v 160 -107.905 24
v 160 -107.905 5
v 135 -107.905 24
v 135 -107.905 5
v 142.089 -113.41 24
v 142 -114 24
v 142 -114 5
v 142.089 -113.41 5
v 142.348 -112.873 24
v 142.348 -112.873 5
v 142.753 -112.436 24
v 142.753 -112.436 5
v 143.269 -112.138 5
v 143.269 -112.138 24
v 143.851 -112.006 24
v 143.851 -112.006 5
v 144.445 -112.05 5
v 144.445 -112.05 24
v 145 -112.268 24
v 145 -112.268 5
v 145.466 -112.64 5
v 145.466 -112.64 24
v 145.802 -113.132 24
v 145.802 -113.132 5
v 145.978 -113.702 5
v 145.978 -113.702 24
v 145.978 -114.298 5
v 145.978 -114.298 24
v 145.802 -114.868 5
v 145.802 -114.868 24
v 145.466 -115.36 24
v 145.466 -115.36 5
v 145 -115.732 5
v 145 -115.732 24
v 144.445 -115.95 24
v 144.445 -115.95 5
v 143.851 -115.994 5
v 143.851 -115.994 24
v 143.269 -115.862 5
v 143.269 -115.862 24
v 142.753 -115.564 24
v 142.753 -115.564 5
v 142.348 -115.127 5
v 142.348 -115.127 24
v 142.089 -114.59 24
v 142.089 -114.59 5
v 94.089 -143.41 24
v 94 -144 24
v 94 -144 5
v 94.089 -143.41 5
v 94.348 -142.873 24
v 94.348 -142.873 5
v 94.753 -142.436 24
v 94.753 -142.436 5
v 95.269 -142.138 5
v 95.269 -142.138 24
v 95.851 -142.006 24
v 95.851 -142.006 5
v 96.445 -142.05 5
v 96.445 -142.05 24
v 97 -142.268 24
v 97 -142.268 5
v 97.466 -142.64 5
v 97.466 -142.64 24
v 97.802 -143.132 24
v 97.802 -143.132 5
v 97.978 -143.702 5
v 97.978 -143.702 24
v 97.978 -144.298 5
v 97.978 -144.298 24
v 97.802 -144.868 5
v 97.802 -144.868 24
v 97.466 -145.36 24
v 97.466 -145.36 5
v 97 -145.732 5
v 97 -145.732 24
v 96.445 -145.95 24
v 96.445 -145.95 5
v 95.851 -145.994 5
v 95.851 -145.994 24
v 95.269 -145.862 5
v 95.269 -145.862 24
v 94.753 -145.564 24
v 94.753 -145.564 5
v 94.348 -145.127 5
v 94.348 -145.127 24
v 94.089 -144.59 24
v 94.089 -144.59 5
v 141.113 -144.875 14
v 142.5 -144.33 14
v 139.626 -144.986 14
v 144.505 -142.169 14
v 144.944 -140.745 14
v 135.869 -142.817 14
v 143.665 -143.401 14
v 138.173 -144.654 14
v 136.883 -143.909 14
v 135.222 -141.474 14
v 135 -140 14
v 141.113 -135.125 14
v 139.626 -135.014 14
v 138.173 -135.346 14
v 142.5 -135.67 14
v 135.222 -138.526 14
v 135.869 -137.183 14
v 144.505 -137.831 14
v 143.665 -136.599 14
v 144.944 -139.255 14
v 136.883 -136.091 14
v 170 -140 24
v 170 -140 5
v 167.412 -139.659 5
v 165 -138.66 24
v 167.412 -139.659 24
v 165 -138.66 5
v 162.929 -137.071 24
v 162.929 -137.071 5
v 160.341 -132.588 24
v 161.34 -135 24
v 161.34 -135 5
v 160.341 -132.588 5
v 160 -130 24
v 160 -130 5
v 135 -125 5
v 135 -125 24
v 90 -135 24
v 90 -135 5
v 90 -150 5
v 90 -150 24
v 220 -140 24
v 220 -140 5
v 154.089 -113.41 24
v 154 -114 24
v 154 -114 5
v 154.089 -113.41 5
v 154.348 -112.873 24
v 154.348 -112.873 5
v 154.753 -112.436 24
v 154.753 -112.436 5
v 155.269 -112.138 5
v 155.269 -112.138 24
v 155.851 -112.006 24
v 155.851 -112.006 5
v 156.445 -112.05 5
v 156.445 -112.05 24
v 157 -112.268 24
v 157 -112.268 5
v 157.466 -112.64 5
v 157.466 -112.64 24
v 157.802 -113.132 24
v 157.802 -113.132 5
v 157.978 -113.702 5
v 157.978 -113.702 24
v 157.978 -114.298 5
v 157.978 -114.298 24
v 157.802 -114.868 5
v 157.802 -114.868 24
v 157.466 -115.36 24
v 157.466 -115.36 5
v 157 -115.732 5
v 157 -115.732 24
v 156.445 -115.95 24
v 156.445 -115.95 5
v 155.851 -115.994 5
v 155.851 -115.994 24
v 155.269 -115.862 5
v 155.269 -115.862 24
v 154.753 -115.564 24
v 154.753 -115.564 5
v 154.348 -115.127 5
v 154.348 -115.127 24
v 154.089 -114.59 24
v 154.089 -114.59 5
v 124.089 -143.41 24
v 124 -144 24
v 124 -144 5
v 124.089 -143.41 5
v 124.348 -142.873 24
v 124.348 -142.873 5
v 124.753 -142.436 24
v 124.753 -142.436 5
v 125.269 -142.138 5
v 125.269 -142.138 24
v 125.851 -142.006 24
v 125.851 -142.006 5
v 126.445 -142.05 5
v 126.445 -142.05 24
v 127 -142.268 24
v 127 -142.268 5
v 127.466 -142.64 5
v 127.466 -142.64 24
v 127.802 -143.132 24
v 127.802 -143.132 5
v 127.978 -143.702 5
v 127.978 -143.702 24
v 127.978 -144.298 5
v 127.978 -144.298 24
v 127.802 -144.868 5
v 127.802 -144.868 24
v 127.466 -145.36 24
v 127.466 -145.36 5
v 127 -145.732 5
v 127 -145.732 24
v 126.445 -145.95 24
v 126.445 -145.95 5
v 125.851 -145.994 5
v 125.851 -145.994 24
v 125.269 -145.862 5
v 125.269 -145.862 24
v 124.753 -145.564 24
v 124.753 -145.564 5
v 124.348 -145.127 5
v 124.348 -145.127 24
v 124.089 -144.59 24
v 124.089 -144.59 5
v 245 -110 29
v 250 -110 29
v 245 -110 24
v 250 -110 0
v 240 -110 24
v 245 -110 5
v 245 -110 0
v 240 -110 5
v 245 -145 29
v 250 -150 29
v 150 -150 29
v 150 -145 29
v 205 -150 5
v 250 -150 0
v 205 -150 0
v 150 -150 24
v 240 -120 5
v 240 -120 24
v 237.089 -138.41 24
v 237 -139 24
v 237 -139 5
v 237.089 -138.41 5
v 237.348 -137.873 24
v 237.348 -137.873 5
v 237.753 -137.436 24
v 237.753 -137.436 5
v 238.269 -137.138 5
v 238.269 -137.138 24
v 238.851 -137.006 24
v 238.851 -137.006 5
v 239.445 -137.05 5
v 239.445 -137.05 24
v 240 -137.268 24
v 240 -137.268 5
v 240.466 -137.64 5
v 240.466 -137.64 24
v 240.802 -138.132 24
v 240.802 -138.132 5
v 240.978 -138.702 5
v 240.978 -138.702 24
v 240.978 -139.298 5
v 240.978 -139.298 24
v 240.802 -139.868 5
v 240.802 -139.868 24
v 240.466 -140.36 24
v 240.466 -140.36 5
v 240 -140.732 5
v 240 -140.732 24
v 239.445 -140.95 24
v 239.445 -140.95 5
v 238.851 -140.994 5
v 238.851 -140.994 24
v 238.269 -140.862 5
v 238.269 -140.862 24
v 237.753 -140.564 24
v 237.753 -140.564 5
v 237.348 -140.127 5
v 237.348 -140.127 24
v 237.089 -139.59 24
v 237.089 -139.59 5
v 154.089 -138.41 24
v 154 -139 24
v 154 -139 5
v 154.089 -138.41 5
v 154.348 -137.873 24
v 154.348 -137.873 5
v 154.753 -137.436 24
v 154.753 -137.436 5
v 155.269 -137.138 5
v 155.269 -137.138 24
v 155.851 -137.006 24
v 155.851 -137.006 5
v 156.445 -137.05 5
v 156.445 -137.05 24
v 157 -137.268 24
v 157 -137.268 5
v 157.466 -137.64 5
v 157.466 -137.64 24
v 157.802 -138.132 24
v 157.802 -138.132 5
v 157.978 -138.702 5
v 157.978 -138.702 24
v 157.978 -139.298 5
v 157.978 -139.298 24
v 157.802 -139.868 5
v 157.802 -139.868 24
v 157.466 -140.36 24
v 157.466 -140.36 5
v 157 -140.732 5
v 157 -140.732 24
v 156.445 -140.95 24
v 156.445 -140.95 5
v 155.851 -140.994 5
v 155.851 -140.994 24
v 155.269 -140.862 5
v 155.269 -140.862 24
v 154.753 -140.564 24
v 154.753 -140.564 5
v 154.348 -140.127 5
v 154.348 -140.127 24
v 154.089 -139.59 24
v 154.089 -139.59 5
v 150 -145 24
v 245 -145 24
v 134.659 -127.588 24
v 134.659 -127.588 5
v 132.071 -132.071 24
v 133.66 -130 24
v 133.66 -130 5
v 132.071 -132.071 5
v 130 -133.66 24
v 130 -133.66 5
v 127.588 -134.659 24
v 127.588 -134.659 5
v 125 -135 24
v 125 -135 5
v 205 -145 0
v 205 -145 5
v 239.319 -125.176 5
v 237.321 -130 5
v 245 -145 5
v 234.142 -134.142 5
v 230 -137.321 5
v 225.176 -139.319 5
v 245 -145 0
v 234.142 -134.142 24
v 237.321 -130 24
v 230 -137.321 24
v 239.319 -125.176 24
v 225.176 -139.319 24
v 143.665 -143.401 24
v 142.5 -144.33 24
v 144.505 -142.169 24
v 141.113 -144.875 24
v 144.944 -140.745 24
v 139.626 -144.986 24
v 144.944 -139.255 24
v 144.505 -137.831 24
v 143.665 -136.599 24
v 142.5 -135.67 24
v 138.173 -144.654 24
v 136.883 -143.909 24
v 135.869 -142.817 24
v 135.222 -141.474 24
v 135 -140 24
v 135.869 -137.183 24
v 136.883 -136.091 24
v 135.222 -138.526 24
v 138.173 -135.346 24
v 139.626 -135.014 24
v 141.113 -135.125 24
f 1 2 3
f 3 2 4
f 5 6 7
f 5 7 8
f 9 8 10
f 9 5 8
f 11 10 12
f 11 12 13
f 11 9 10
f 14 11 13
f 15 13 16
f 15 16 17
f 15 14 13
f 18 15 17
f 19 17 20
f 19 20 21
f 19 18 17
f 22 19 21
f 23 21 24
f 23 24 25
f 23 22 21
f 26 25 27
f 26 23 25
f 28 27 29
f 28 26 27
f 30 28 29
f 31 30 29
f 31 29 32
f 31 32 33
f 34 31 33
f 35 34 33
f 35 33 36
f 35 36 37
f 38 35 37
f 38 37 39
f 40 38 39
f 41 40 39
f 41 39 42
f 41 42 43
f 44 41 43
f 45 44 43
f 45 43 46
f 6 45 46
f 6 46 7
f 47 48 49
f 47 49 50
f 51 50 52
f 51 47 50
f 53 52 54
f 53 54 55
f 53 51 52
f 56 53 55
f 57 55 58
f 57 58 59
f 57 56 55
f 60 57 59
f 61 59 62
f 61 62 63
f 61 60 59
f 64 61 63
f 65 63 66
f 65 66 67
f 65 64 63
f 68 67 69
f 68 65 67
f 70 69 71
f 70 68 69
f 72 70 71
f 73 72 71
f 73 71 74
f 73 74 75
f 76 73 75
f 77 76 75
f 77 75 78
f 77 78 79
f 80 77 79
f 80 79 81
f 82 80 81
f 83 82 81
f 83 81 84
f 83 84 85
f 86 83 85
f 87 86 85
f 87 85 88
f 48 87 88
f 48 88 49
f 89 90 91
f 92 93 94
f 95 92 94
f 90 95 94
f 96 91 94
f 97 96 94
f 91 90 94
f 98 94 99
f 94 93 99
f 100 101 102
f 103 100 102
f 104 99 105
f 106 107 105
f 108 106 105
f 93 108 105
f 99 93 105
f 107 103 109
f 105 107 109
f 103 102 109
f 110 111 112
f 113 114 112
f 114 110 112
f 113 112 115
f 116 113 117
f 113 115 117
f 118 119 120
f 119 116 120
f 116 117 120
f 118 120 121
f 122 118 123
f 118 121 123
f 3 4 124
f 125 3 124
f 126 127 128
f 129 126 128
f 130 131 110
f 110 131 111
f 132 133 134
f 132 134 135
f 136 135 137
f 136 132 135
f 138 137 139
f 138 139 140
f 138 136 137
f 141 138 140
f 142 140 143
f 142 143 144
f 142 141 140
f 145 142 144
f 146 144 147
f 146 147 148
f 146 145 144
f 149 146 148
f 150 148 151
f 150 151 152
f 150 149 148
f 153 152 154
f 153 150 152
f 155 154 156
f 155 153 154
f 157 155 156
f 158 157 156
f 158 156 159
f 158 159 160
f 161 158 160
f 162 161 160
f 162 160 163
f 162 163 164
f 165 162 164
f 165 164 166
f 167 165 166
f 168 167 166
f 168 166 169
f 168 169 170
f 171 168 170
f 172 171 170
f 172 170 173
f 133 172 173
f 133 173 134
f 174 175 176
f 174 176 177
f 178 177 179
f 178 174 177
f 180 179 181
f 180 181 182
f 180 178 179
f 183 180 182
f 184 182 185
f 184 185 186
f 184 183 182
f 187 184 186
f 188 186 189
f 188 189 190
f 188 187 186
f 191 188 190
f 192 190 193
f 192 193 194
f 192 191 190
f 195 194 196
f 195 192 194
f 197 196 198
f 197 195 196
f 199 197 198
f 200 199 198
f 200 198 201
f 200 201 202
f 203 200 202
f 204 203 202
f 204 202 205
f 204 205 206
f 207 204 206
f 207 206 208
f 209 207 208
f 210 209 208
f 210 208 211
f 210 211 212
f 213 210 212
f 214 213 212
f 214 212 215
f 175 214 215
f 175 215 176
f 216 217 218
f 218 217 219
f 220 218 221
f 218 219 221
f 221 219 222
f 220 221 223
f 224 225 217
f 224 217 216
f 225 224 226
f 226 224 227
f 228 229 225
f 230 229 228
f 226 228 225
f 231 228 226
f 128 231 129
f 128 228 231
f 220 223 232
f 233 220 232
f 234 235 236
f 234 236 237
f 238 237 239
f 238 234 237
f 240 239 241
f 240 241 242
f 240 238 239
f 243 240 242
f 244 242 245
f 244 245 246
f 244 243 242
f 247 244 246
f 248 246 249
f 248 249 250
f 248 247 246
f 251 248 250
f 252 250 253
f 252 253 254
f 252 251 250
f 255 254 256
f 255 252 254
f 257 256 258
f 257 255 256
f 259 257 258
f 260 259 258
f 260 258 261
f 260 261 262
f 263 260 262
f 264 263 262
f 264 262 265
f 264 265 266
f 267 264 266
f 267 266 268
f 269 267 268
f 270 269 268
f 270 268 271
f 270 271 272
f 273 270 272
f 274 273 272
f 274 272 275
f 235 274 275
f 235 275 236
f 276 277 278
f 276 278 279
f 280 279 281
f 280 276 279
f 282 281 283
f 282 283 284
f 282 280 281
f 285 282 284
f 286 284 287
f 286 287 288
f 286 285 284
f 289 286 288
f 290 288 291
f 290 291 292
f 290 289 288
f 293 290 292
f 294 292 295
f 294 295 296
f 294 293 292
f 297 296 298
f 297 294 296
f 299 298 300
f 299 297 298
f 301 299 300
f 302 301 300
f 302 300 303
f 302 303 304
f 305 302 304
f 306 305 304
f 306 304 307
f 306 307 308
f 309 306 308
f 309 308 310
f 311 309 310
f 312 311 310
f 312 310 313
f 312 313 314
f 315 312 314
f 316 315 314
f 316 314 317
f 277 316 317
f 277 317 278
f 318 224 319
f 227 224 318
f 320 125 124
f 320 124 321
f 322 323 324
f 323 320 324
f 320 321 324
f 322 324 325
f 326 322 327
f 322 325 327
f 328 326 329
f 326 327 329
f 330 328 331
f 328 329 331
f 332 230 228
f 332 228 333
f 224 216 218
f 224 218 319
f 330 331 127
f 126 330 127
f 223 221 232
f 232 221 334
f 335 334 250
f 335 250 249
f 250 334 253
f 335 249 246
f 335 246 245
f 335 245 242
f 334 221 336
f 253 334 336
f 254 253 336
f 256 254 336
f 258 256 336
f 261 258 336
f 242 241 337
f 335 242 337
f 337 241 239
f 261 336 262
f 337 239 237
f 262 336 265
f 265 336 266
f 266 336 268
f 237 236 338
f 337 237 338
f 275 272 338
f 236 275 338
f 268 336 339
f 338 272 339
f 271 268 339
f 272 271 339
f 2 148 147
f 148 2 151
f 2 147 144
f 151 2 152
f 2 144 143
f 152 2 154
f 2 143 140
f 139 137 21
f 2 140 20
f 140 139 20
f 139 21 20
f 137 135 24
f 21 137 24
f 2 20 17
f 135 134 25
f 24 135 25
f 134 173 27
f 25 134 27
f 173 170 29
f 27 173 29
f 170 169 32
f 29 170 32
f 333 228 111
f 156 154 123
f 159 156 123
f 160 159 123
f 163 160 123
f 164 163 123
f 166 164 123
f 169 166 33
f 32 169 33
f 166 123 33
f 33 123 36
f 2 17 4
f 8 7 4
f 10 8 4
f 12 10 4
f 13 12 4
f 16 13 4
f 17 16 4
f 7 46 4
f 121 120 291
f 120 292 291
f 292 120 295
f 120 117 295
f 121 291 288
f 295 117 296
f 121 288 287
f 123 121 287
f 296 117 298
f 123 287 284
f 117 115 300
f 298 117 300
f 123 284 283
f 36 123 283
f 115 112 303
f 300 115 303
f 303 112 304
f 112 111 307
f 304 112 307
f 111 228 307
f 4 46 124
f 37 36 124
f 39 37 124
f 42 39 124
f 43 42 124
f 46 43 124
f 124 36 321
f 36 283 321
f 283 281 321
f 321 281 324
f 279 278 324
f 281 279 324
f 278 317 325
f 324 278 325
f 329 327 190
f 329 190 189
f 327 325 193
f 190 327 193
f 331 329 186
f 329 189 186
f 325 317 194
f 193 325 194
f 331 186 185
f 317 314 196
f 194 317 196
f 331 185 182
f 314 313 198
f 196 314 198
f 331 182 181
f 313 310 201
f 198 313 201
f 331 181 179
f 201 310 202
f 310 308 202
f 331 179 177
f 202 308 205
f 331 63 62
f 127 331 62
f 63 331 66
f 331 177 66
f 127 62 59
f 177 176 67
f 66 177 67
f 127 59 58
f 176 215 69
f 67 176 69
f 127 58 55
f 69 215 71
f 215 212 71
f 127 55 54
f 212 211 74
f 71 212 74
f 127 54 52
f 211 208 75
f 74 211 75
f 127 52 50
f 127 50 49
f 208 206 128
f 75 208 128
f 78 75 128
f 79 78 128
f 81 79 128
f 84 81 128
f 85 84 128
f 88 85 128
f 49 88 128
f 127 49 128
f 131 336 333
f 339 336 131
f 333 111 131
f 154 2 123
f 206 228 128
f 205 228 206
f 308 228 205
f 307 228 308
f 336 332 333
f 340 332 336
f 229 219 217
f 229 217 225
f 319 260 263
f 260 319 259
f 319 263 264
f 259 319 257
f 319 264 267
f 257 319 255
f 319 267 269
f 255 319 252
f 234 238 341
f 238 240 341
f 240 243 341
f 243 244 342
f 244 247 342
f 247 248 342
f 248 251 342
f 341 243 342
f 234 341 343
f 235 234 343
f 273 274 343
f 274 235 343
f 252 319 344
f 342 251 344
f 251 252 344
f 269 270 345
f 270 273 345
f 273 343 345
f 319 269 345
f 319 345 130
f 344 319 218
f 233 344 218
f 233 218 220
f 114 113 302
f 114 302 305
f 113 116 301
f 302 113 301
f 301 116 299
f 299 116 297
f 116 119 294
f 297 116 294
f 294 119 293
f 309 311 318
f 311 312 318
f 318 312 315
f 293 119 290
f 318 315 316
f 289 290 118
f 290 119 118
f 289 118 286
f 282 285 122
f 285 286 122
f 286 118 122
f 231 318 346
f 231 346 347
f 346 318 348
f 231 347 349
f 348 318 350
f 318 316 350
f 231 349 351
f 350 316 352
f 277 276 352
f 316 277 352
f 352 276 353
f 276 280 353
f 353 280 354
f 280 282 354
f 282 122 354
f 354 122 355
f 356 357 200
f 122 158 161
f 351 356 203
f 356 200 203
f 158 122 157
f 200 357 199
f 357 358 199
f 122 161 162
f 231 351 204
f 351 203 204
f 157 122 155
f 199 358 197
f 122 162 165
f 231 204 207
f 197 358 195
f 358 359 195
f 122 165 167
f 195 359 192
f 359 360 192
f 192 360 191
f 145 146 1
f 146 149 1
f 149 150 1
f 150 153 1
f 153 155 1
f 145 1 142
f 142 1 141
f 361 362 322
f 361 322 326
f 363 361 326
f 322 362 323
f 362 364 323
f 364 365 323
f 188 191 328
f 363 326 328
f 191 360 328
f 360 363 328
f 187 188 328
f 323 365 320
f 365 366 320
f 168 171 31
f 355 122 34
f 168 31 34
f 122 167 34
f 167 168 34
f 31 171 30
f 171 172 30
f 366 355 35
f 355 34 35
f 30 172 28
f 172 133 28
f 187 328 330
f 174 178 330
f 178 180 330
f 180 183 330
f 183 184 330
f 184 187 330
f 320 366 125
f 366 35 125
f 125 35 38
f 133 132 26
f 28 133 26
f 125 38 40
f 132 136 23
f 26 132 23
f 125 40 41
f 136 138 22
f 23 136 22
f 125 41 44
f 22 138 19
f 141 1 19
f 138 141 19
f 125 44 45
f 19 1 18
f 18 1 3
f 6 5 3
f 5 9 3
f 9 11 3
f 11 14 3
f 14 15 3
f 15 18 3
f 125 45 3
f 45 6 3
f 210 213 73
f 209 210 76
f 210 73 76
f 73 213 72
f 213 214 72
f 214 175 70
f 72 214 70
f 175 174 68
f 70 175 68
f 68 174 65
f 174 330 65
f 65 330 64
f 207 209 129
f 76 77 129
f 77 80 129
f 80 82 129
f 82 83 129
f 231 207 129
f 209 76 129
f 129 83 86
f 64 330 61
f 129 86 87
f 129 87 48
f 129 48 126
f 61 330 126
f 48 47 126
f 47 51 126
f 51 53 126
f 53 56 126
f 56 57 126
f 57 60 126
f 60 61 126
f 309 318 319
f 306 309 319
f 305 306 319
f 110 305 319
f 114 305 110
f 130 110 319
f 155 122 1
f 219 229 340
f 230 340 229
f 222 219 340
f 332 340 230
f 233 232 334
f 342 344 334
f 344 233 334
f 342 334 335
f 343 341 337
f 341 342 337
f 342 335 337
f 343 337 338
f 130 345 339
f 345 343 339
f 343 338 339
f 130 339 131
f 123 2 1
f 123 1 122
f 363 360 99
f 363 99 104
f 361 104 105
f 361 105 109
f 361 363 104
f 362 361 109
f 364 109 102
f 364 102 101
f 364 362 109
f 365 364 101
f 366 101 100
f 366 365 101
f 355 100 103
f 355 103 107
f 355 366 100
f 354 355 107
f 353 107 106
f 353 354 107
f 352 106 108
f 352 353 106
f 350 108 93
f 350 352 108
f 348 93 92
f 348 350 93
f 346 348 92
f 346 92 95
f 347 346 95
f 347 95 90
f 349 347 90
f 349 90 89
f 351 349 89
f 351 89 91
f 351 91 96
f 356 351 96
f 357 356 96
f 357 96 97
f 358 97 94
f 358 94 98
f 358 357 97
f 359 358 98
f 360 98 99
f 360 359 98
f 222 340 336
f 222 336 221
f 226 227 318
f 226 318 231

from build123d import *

# Parameters (mm, degrees)
PAD004_DEPTH    = 29
POCKET001_DEPTH = 5
POCKET002_DEPTH = 5
SKETCH008_R     = 5
POCKET003_DEPTH = 10
SKETCH015_R     = 2
POCKET007_DEPTH = 24.001


with BuildPart() as anchorbl:
    # Sketch004 → Pad004 (new body)
    with BuildSketch(Plane.XY):
        with BuildLine():
            Line((0, 40), (0, 0))
            Line((0, 0), (160, 0))
            Line((160, 15), (160, 0))
            Line((125, 15), (160, 15))
            ThreePointArc((115, 25), (117.928932, 17.928932), (125, 15))
            Line((115, 42.094566), (115, 25))
            Line((90, 42.094566), (115, 42.094566))
            Line((90, 42.094566), (90, 20))
            ThreePointArc((80, 10), (87.071068, 12.928932), (90, 20))
            Line((30, 10), (80, 10))
            ThreePointArc((10, 30), (15.857864, 15.857864), (30, 10))
            Line((10, 40), (10, 30))
            Line((0, 40), (10, 40))
        make_face()
    extrude(amount=PAD004_DEPTH)

    # Sketch006 (on Face15 of Pad004) → Pocket001 (cut)
    with BuildSketch(Plane.XY.offset(29)):
        Polygon((5, 45), (5, 5), (100, 5), (100, -8.029739), (275.374889, -8.029739), (275.374889, 45), align=None)
    extrude(amount=-POCKET001_DEPTH, mode=Mode.SUBTRACT)

    # Sketch007 (on Face2 of Pocket001) → Pocket002 (cut)
    with BuildSketch(Plane(origin=(0, 0, 0), x_dir=(1, 0, 0), z_dir=(0, 0, -1))):
        Polygon((5, -5), (5, -45), (160, -45), (160, 8.546066), (45, 8.546066), (45, -5), align=None)
    extrude(amount=-POCKET002_DEPTH, mode=Mode.SUBTRACT)

    # Sketch008 (on Face4 of Pocket002) → Pocket003 (cut)
    with BuildSketch(Plane.XY.offset(24)):
        with Locations((110, 10)):
            Circle(SKETCH008_R)
    extrude(amount=-POCKET003_DEPTH, mode=Mode.SUBTRACT)

    # Sketch015 (on Face4 of Pocket003) → Pocket007 (cut, through all)
    with BuildSketch(Plane.XY.offset(24)):
        with Locations((11, 11)):
            Circle(SKETCH015_R)
        with Locations((94, 11)):
            Circle(SKETCH015_R)
        with Locations((94, 36)):
            Circle(SKETCH015_R)
        with Locations((106, 36)):
            Circle(SKETCH015_R)
        with Locations((124, 6)):
            Circle(SKETCH015_R)
        with Locations((154, 6)):
            Circle(SKETCH015_R)
    extrude(amount=-POCKET007_DEPTH, mode=Mode.SUBTRACT)


with BuildPart() as anchorbl_1:
    # Body004 placement: moved
    add(anchorbl.part.moved(Location((-250, -150, 0))))


with BuildPart() as anchorbr:
    # Part__Mirroring001: instance of AnchorBL
    add(anchorbl_1.part.mirror(Plane(origin=(0, 0, 0), x_dir=(0, -1, 0), z_dir=(1, 0, 0))))


solid = anchorbr.part
